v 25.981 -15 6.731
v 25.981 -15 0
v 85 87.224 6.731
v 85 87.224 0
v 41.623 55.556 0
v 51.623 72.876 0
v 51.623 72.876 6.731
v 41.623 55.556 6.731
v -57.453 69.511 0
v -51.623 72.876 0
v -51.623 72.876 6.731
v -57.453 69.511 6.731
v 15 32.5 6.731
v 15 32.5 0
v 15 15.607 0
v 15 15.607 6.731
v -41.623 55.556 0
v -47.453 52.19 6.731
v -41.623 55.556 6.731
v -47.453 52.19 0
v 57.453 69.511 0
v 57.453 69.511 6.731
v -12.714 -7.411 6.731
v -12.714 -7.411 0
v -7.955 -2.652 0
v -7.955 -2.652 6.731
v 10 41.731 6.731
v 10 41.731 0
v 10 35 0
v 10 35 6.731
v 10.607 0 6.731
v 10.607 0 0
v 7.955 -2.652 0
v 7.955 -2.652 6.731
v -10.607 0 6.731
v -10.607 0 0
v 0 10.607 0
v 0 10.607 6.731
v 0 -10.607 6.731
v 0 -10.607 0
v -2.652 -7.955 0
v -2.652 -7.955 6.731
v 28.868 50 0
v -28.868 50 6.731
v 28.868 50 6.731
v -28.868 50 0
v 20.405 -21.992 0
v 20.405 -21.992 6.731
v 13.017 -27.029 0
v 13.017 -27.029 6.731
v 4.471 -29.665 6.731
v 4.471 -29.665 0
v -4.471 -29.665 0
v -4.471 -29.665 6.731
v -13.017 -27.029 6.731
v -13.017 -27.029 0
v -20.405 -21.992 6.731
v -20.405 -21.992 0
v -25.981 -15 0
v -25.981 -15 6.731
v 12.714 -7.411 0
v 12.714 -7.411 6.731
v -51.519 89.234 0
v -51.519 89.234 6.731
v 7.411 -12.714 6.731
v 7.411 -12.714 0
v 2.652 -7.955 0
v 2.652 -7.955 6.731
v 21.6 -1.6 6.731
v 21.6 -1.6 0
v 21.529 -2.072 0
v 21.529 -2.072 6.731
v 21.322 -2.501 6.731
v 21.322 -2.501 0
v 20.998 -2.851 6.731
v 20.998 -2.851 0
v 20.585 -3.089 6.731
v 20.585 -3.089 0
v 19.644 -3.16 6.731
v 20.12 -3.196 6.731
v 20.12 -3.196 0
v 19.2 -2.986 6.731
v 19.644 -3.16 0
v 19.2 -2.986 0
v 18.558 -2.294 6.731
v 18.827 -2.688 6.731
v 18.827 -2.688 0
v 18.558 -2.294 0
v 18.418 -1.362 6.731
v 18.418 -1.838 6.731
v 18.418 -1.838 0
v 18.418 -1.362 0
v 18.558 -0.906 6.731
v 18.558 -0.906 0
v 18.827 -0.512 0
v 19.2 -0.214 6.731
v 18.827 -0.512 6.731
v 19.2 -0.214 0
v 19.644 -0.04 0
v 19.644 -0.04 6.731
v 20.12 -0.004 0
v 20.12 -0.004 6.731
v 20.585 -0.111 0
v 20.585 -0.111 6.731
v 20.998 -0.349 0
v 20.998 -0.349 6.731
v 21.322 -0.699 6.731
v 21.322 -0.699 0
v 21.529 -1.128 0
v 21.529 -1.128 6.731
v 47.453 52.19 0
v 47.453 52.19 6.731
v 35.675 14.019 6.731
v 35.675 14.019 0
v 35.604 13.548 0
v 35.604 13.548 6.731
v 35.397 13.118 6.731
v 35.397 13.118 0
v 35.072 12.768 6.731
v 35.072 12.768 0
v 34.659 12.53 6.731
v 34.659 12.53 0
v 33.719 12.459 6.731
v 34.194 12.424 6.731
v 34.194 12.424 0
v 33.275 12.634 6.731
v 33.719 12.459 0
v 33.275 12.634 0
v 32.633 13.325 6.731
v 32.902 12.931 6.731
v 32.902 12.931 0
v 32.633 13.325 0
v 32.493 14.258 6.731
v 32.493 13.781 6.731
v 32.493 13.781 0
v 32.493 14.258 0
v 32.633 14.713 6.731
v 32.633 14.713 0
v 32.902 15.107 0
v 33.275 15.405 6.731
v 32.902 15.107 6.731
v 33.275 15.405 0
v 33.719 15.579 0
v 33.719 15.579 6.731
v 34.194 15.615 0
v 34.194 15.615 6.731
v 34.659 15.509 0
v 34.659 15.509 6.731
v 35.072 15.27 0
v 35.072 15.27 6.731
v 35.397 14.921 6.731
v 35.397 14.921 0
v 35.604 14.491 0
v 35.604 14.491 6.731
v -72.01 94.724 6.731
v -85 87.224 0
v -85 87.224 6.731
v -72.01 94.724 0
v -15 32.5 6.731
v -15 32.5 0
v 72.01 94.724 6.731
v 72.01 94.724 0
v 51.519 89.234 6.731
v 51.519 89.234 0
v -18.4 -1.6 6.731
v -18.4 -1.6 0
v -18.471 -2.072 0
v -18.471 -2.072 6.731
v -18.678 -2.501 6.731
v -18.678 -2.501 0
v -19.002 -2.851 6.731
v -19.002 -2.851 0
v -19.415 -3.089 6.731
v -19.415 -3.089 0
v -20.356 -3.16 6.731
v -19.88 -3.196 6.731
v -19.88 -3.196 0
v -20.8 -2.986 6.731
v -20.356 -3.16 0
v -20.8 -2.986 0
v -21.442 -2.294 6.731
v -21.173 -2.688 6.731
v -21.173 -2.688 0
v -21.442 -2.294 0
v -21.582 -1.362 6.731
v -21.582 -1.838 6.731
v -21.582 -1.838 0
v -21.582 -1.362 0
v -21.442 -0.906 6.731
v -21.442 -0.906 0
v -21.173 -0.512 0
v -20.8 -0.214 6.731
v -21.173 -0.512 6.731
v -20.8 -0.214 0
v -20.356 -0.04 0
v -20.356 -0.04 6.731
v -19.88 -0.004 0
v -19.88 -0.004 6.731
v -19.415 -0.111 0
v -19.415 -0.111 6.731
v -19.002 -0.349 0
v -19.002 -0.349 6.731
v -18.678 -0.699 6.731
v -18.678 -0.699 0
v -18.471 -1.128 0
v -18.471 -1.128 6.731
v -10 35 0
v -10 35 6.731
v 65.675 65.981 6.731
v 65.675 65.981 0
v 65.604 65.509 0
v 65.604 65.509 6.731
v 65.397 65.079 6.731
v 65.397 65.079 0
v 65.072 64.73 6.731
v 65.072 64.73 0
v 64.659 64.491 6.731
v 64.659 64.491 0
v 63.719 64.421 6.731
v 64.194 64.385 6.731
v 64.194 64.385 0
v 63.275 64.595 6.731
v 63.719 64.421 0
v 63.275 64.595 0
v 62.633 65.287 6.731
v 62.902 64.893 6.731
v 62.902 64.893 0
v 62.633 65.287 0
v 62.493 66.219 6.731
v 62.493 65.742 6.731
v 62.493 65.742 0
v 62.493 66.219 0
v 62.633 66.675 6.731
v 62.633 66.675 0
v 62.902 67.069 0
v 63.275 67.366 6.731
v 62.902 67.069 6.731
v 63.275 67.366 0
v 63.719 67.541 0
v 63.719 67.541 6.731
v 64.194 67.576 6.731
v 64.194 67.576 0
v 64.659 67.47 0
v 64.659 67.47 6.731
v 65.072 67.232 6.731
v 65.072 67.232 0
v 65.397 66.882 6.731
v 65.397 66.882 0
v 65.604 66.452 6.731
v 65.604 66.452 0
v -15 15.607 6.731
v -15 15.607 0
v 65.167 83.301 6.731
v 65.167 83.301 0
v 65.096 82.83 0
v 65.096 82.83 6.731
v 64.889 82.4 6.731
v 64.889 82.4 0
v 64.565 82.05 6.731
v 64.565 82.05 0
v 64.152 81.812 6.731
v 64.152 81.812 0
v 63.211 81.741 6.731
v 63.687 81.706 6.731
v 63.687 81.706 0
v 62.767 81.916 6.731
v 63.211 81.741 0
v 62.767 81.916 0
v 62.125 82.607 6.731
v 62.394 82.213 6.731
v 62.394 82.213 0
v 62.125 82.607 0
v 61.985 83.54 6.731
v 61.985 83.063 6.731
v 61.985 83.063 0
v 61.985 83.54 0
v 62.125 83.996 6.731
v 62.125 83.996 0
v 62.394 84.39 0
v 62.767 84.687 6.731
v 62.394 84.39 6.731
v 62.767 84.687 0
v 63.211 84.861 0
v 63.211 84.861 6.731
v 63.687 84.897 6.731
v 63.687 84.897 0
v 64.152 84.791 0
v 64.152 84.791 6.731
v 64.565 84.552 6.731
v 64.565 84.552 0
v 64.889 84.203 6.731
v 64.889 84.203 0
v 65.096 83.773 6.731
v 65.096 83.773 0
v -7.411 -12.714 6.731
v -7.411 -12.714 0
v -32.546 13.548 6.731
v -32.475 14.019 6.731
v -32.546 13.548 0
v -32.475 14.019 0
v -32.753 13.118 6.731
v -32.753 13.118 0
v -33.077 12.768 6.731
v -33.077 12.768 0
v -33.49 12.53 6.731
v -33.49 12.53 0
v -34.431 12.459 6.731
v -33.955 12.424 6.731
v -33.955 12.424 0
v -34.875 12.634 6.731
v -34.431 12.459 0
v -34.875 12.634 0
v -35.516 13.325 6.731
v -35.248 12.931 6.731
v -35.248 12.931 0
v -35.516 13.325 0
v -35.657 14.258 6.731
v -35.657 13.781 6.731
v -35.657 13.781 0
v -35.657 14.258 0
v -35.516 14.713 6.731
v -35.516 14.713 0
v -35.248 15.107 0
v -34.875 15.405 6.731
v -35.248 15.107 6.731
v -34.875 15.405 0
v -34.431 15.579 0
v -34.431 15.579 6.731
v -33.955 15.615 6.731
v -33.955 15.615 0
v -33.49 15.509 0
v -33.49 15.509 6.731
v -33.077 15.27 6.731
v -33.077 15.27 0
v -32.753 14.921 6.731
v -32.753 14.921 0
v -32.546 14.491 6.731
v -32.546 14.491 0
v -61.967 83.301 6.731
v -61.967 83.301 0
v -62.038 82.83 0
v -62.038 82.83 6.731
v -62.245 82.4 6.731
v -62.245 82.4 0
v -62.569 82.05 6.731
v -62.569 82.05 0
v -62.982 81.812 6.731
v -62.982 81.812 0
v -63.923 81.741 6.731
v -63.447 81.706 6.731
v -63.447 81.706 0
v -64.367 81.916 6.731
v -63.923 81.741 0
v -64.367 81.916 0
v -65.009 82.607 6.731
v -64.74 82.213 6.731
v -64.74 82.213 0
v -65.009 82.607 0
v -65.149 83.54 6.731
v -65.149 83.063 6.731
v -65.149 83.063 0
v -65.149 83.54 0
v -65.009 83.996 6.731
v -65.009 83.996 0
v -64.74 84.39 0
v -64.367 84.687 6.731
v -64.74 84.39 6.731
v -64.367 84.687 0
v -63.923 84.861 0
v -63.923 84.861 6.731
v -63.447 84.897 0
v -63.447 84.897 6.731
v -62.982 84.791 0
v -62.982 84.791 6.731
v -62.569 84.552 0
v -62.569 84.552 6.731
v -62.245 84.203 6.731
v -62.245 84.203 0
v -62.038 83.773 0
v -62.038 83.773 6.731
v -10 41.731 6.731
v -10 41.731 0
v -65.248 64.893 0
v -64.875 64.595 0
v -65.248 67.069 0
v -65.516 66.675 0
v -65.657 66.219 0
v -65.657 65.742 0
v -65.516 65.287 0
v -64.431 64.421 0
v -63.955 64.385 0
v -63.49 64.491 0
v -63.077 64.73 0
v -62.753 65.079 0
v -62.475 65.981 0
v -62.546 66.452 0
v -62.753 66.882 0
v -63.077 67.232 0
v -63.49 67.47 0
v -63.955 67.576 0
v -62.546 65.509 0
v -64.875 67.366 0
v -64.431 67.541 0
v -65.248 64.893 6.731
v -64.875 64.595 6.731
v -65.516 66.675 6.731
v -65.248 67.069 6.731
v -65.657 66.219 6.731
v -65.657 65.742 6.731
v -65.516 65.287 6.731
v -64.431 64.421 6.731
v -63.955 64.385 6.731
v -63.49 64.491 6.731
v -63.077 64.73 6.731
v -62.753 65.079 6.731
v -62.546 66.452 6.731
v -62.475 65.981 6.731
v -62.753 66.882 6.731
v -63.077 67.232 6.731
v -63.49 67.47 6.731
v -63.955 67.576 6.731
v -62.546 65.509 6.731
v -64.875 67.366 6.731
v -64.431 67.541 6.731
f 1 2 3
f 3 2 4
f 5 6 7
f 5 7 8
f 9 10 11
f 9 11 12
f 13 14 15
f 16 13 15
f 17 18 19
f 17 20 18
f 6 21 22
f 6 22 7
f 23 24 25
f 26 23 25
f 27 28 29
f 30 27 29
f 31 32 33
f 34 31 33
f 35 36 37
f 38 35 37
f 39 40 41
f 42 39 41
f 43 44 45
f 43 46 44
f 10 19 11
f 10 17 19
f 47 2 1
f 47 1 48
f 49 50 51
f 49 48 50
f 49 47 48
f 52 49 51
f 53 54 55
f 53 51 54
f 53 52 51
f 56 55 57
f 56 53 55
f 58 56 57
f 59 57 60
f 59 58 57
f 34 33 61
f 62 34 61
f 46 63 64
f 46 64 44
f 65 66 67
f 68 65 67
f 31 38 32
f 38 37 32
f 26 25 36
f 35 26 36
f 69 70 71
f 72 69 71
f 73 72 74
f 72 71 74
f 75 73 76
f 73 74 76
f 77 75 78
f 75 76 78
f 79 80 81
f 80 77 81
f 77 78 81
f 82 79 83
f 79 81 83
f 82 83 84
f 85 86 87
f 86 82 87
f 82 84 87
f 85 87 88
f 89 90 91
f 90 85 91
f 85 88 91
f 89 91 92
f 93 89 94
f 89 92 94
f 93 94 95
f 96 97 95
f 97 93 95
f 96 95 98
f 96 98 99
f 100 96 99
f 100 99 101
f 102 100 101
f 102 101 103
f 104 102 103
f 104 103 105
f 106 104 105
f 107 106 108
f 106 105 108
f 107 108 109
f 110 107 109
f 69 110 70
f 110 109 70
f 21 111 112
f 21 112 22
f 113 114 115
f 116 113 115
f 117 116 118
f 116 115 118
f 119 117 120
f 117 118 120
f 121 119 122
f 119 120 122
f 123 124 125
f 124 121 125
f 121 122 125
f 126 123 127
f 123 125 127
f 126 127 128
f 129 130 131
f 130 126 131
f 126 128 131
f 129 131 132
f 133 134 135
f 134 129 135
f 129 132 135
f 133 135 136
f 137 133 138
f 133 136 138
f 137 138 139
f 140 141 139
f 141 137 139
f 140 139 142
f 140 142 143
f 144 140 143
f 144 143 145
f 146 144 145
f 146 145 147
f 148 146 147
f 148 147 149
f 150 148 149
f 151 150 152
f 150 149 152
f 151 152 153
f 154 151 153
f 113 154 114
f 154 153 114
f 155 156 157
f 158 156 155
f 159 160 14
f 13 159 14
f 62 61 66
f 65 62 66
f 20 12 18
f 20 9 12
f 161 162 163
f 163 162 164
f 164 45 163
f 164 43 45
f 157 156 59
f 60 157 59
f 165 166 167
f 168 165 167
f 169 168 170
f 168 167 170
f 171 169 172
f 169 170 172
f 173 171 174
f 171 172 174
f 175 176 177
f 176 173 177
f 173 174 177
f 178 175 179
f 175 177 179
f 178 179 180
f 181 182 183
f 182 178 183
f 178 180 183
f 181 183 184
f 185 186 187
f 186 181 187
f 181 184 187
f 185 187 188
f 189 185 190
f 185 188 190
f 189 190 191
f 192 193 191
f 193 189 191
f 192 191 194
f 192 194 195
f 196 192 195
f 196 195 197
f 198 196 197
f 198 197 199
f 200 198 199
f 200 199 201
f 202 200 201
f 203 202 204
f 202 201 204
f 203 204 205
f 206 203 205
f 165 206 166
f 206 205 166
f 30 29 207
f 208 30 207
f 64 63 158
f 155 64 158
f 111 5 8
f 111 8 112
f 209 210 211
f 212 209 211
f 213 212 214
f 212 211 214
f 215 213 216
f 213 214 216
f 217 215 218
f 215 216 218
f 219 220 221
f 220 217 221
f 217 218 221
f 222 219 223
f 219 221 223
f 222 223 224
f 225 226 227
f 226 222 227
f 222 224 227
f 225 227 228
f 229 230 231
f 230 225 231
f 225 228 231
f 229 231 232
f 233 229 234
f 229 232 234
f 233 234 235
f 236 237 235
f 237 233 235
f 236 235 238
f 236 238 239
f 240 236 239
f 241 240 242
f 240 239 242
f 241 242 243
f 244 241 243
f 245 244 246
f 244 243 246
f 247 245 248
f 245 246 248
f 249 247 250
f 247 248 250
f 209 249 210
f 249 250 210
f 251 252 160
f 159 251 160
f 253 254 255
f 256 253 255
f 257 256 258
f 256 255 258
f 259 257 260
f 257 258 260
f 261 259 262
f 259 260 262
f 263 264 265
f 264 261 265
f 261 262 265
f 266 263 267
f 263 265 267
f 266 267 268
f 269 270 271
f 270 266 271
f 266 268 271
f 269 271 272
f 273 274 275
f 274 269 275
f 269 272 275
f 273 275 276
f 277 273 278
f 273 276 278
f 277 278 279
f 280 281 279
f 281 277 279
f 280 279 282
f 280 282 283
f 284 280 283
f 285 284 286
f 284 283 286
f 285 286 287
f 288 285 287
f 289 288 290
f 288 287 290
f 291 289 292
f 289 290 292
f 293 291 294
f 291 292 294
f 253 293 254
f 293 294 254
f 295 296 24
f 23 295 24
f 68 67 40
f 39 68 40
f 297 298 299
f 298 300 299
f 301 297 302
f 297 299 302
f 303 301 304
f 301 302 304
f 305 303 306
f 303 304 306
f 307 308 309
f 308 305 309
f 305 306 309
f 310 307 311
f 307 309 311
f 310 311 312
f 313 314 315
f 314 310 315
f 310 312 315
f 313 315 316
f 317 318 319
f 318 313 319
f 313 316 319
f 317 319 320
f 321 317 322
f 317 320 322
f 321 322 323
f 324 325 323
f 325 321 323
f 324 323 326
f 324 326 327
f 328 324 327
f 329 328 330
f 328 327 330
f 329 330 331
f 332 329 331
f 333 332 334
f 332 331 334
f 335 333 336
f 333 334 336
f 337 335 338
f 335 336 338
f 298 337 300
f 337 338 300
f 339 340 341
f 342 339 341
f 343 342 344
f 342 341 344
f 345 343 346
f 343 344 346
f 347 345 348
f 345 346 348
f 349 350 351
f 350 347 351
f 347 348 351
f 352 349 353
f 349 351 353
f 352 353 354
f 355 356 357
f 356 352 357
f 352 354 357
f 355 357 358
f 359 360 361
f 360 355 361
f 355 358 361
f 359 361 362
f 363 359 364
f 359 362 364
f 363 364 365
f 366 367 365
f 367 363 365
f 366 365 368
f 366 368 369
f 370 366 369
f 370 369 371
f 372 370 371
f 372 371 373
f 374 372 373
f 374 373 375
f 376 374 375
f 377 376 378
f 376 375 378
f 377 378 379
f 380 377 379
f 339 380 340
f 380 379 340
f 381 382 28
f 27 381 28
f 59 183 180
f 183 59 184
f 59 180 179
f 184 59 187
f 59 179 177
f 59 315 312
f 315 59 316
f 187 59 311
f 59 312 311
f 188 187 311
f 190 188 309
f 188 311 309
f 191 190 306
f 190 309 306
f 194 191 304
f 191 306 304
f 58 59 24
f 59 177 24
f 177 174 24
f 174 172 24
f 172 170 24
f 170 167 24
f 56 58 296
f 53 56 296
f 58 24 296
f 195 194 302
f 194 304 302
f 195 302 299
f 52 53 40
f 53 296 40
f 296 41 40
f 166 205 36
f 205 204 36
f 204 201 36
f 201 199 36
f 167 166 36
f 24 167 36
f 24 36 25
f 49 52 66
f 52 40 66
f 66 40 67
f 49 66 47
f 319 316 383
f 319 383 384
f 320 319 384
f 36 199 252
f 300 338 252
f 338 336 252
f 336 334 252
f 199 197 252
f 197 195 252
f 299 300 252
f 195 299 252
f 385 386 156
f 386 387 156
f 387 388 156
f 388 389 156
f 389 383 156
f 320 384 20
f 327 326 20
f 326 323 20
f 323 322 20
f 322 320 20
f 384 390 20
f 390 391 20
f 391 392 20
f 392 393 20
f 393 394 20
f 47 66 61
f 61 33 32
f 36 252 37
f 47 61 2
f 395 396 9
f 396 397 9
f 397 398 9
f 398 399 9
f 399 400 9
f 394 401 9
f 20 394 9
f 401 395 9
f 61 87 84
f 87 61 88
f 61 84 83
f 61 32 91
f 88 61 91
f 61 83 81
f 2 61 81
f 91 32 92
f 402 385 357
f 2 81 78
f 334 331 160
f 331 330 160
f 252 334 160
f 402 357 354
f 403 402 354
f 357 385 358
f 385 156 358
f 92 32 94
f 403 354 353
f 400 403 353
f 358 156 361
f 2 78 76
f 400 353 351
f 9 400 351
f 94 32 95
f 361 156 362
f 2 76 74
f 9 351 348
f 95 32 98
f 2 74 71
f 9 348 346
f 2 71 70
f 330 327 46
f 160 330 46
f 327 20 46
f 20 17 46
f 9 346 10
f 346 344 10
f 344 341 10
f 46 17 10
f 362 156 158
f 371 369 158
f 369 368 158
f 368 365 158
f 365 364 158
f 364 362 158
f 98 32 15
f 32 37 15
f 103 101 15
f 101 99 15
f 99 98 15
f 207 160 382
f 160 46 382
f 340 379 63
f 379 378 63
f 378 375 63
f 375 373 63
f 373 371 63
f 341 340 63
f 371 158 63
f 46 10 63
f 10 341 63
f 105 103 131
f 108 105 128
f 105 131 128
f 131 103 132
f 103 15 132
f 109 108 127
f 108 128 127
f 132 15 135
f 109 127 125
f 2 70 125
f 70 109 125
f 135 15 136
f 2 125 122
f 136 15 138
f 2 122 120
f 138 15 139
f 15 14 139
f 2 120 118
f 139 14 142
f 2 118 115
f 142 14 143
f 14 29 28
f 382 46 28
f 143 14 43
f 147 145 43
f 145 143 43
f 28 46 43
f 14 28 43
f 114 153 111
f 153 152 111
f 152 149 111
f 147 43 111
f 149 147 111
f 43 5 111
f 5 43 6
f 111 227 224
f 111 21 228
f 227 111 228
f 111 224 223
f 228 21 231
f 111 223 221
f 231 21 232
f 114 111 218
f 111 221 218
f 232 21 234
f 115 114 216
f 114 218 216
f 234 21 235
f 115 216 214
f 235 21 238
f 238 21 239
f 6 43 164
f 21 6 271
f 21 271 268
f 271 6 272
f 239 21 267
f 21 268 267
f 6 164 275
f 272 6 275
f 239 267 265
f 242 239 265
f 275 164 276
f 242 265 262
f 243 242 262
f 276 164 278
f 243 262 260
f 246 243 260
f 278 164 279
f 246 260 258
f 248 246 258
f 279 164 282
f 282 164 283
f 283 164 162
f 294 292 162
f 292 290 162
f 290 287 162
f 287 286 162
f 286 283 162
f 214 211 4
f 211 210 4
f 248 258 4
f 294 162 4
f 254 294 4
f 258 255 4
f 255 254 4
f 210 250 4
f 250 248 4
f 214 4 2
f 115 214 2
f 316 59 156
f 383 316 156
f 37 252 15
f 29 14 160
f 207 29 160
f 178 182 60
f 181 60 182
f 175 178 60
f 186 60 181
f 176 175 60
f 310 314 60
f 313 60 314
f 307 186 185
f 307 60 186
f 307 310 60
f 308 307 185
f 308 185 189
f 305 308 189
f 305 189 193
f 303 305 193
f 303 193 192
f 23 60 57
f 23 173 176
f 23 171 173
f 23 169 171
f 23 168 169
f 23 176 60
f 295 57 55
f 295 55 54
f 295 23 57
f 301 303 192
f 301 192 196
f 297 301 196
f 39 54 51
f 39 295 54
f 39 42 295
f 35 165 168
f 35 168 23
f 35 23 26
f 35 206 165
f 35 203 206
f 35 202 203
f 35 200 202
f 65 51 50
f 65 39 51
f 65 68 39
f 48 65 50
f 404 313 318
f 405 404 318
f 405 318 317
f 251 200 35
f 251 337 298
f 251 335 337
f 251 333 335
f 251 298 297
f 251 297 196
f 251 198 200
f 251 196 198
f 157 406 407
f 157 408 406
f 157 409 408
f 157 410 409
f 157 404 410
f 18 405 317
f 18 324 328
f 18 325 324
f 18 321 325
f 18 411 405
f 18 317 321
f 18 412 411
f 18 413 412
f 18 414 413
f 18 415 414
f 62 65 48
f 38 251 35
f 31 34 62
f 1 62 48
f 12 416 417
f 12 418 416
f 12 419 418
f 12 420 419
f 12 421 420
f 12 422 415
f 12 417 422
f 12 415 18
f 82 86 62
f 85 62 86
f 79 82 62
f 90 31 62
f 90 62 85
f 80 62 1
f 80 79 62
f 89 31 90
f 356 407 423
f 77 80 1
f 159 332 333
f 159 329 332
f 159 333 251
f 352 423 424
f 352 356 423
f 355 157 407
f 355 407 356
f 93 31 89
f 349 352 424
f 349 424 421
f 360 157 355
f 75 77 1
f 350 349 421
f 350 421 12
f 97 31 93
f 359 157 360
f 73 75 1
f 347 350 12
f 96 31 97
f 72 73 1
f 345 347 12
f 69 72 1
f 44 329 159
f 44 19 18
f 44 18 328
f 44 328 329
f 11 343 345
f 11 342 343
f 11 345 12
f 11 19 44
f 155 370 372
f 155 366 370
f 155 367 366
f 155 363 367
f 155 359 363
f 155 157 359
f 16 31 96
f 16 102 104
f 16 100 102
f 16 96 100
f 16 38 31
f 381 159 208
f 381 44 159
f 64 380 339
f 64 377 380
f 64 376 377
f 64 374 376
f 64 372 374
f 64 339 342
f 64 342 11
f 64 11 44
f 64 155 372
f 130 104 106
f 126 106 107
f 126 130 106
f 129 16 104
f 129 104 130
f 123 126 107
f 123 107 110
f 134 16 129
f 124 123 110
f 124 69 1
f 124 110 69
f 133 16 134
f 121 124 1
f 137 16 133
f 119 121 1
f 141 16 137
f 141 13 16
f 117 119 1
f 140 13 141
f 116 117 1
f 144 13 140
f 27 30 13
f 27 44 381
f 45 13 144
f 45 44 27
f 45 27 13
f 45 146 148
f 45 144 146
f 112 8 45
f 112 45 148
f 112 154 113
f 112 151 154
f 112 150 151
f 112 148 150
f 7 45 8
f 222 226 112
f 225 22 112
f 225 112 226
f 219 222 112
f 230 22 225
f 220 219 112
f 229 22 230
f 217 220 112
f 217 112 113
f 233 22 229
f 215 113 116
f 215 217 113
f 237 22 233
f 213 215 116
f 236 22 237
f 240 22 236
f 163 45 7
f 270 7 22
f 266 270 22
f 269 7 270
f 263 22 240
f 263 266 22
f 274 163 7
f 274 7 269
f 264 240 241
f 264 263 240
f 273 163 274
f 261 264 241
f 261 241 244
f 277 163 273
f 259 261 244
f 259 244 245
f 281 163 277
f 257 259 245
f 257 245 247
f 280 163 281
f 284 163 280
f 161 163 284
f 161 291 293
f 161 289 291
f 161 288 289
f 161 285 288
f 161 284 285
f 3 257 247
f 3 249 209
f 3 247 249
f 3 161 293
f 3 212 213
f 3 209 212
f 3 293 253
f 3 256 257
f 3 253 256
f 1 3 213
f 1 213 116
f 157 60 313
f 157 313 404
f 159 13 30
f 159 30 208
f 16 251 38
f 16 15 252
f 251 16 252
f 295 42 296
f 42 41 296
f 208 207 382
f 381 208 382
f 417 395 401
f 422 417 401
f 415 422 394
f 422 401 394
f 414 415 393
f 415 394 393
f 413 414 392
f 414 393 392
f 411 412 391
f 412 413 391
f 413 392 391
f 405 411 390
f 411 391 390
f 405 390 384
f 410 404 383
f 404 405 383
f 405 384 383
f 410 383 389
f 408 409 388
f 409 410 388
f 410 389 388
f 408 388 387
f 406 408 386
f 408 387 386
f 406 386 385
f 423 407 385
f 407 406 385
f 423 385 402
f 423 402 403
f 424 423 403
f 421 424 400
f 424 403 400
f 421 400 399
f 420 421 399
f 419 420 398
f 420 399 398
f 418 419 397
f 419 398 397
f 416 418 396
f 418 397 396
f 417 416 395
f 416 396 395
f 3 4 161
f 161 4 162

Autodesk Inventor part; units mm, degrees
ref_plane "YZ Plane" through (0, 0, 0) normal (1, 0, 0) x (0, 1, 0)
ref_plane "XZ Plane" through (0, 0, 0) normal (0, 1, 0) x (-1, 0, 0)
ref_plane "XY Plane" through (0, 0, 0) normal (0, 0, 1) x (1, 0, 0)
sketch "Sketch1" plane through (0, 0, 0) normal (0, 0, 1) x (1, 0, 0)
  line L0 (-10.6066, 0) -> (0, 10.6066)
  line L1 (0, 10.6066) -> (10.6066, 0)
  line L2 (10.6066, 0) -> (0, -10.6066)
  line L3 (0, -10.6066) -> (-10.6066, 0)
  arc A0 (-25.9808, -15) -> (25.9808, -15) centre (0, 0) ccw
  line L4 (25.9808, -15) -> (85, 87.2243)
  line L5 (10, 41.731) -> (10, 35)
  line L6 (10, 35) -> (-10, 35)
  line L7 (-10, 35) -> (-10, 41.731)
  line L8 (-10, 41.731) -> (10, 41.731)
  line L9 (-85, 87.2243) -> (-25.9808, -15)
  circle A1 centre (-49.0748, 40) radius 1.6
  circle A2 centre (-64.0748, 65.9808) radius 1.6
  circle A3 centre (49.0748, 40) radius 1.6
  circle A4 centre (64.0748, 65.9808) radius 1.6
  line L10 (-85, 87.2243) -> (-72.0096, 94.7243)
  line L11 (-51.5192, 89.2339) -> (-28.8675, 50)
  line L12 (-28.8675, 50) -> (28.8675, 50)
  line L13 (28.8675, 50) -> (51.5192, 89.2339)
  line L14 (2.6517, -7.955) -> (7.955, -2.6517)
  line L15 (7.955, -2.6517) -> (12.7145, -7.4112)
  line L16 (12.7145, -7.4112) -> (7.4112, -12.7145)
  line L17 (7.4112, -12.7145) -> (2.6517, -7.955)
  line L18 (-2.6517, -7.955) -> (-7.4112, -12.7145)
  line L19 (-7.4112, -12.7145) -> (-12.7145, -7.4112)
  line L20 (-12.7145, -7.4112) -> (-7.955, -2.6517)
  line L21 (-7.955, -2.6517) -> (-2.6517, -7.955)
  circle A5 centre (-38.567, 40) radius 1.6
  circle A6 centre (38.567, 40) radius 1.6
  circle A7 centre (-63.567, 83.3013) radius 1.6
  circle A8 centre (63.567, 83.3013) radius 1.6
  circle A9 centre (-20, -1.6) radius 1.6
  circle A10 centre (20, -1.6) radius 1.6
  line L22 (-57.4526, 69.5109) -> (-47.4526, 52.1904)
  line L23 (-47.4526, 52.1904) -> (-41.6234, 55.5559)
  line L24 (-41.6234, 55.5559) -> (-51.6234, 72.8764)
  line L25 (-51.6234, 72.8764) -> (-57.4526, 69.5109)
  line L26 (47.4526, 52.1904) -> (57.4526, 69.5109)
  line L27 (57.4526, 69.5109) -> (51.6234, 72.8764)
  line L28 (51.6234, 72.8764) -> (41.6234, 55.5559)
  line L29 (41.6234, 55.5559) -> (47.4526, 52.1904)
  line L30 (-15, 32.5) -> (15, 32.5)
  line L31 (15, 32.5) -> (15, 15.6066)
  line L32 (15, 15.6066) -> (-15, 15.6066)
  line L33 (-15, 15.6066) -> (-15, 32.5)
  line L34 (-10.6066, 0) -> (10.6066, 0)
  line L35 (25.9808, -15) -> (0, -60)
  line L36 (0, -60) -> (-25.9808, -15)
  line L37 (85, 87.2243) -> (72.0096, 94.7243)
  circle A11 centre (-34.0748, 14.0192) radius 1.6
  circle A12 centre (34.0748, 14.0192) radius 1.6
  line L38 (72.0096, 94.7243) -> (51.5192, 89.2339)
  line L39 (-51.5192, 89.2339) -> (-72.0096, 94.7243)
  point P0 (0, 0)
  point P1 (0, 35)
  point P2 (0, 32.5)
  dimension "d0" = 15
  dimension "d9" = 30
  dimension "d11" = 6.731
  dimension "d12" = 20
  dimension "d25" = 60
  dimension "d34" = 3.2
  dimension "d36" = 30
  dimension "d38" = 30
  dimension "d40" = 7.5
  dimension "d41" = 7.5
  dimension "d42" = 7.5
  dimension "d43" = 7.5
  dimension "d45" = 40
  dimension "d54" = 50
  dimension "d55" = 0
  dimension "d56" = 0
  dimension "d57" = 7.5
  dimension "d58" = 3.75
  dimension "d63" = 15
  dimension "d64" = 3.2
  dimension "d66" = 50
  dimension "d67" = 15
  dimension "d68" = 15
  dimension "d73" = 20
  dimension "d74" = 15
  dimension "d75" = 15
  dimension "d76" = 15
  dimension "d77" = 15
  dimension "d79" = 35
  dimension "d80" = 2.5
  dimension "d81" = 5
  dimension "d82" = 30
  dimension "d83" = 20
  dimension "d84" = 20
  dimension "d85" = 40
  dimension "d86" = 170
  dimension "d88" = 30
  dimension "d89" = 30
  dimension "d90" = 7.5
  dimension "d91" = 7.5
  dimension "d92" = 135
  dimension "d93" = 30
  dimension "d94" = 45
  dimension "d95" = 15
extrude "Extrusion2" add sketch "Sketch1" along normal blind 6.731 contours L9 L10 L39 L11 L12 L13 L38 L37 L4 A0 | A5 | A6
sketch "Sketch2" plane through (0, 0, 6.731) normal (0, 0, 1) x (1, 0, 0)
  circle A0 centre (49.0748, 40) radius 1.6 projected
  circle A1 centre (-49.0748, 40) radius 1.6 projected
extrude "Extrusion3" add sketch "Sketch2" against normal up to surface (6.731 mm away)
equation "\"d38\" = d36"
equation "\"d41\" = d40"
equation "\"d58\" = 0.5 * d57"
equation "\"THICKA\" = 3.175"
equation "\"THICKB\" = 6.731"
equation "\"THICKC\" = 12.7"
equation "\"BALLDIA\" = 12"
equation "\"MAGDIA\" = 9.5"
equation "\"THICKPLY\" = 5"
properties part number "Frame_Upper_Plate_Bottom"
